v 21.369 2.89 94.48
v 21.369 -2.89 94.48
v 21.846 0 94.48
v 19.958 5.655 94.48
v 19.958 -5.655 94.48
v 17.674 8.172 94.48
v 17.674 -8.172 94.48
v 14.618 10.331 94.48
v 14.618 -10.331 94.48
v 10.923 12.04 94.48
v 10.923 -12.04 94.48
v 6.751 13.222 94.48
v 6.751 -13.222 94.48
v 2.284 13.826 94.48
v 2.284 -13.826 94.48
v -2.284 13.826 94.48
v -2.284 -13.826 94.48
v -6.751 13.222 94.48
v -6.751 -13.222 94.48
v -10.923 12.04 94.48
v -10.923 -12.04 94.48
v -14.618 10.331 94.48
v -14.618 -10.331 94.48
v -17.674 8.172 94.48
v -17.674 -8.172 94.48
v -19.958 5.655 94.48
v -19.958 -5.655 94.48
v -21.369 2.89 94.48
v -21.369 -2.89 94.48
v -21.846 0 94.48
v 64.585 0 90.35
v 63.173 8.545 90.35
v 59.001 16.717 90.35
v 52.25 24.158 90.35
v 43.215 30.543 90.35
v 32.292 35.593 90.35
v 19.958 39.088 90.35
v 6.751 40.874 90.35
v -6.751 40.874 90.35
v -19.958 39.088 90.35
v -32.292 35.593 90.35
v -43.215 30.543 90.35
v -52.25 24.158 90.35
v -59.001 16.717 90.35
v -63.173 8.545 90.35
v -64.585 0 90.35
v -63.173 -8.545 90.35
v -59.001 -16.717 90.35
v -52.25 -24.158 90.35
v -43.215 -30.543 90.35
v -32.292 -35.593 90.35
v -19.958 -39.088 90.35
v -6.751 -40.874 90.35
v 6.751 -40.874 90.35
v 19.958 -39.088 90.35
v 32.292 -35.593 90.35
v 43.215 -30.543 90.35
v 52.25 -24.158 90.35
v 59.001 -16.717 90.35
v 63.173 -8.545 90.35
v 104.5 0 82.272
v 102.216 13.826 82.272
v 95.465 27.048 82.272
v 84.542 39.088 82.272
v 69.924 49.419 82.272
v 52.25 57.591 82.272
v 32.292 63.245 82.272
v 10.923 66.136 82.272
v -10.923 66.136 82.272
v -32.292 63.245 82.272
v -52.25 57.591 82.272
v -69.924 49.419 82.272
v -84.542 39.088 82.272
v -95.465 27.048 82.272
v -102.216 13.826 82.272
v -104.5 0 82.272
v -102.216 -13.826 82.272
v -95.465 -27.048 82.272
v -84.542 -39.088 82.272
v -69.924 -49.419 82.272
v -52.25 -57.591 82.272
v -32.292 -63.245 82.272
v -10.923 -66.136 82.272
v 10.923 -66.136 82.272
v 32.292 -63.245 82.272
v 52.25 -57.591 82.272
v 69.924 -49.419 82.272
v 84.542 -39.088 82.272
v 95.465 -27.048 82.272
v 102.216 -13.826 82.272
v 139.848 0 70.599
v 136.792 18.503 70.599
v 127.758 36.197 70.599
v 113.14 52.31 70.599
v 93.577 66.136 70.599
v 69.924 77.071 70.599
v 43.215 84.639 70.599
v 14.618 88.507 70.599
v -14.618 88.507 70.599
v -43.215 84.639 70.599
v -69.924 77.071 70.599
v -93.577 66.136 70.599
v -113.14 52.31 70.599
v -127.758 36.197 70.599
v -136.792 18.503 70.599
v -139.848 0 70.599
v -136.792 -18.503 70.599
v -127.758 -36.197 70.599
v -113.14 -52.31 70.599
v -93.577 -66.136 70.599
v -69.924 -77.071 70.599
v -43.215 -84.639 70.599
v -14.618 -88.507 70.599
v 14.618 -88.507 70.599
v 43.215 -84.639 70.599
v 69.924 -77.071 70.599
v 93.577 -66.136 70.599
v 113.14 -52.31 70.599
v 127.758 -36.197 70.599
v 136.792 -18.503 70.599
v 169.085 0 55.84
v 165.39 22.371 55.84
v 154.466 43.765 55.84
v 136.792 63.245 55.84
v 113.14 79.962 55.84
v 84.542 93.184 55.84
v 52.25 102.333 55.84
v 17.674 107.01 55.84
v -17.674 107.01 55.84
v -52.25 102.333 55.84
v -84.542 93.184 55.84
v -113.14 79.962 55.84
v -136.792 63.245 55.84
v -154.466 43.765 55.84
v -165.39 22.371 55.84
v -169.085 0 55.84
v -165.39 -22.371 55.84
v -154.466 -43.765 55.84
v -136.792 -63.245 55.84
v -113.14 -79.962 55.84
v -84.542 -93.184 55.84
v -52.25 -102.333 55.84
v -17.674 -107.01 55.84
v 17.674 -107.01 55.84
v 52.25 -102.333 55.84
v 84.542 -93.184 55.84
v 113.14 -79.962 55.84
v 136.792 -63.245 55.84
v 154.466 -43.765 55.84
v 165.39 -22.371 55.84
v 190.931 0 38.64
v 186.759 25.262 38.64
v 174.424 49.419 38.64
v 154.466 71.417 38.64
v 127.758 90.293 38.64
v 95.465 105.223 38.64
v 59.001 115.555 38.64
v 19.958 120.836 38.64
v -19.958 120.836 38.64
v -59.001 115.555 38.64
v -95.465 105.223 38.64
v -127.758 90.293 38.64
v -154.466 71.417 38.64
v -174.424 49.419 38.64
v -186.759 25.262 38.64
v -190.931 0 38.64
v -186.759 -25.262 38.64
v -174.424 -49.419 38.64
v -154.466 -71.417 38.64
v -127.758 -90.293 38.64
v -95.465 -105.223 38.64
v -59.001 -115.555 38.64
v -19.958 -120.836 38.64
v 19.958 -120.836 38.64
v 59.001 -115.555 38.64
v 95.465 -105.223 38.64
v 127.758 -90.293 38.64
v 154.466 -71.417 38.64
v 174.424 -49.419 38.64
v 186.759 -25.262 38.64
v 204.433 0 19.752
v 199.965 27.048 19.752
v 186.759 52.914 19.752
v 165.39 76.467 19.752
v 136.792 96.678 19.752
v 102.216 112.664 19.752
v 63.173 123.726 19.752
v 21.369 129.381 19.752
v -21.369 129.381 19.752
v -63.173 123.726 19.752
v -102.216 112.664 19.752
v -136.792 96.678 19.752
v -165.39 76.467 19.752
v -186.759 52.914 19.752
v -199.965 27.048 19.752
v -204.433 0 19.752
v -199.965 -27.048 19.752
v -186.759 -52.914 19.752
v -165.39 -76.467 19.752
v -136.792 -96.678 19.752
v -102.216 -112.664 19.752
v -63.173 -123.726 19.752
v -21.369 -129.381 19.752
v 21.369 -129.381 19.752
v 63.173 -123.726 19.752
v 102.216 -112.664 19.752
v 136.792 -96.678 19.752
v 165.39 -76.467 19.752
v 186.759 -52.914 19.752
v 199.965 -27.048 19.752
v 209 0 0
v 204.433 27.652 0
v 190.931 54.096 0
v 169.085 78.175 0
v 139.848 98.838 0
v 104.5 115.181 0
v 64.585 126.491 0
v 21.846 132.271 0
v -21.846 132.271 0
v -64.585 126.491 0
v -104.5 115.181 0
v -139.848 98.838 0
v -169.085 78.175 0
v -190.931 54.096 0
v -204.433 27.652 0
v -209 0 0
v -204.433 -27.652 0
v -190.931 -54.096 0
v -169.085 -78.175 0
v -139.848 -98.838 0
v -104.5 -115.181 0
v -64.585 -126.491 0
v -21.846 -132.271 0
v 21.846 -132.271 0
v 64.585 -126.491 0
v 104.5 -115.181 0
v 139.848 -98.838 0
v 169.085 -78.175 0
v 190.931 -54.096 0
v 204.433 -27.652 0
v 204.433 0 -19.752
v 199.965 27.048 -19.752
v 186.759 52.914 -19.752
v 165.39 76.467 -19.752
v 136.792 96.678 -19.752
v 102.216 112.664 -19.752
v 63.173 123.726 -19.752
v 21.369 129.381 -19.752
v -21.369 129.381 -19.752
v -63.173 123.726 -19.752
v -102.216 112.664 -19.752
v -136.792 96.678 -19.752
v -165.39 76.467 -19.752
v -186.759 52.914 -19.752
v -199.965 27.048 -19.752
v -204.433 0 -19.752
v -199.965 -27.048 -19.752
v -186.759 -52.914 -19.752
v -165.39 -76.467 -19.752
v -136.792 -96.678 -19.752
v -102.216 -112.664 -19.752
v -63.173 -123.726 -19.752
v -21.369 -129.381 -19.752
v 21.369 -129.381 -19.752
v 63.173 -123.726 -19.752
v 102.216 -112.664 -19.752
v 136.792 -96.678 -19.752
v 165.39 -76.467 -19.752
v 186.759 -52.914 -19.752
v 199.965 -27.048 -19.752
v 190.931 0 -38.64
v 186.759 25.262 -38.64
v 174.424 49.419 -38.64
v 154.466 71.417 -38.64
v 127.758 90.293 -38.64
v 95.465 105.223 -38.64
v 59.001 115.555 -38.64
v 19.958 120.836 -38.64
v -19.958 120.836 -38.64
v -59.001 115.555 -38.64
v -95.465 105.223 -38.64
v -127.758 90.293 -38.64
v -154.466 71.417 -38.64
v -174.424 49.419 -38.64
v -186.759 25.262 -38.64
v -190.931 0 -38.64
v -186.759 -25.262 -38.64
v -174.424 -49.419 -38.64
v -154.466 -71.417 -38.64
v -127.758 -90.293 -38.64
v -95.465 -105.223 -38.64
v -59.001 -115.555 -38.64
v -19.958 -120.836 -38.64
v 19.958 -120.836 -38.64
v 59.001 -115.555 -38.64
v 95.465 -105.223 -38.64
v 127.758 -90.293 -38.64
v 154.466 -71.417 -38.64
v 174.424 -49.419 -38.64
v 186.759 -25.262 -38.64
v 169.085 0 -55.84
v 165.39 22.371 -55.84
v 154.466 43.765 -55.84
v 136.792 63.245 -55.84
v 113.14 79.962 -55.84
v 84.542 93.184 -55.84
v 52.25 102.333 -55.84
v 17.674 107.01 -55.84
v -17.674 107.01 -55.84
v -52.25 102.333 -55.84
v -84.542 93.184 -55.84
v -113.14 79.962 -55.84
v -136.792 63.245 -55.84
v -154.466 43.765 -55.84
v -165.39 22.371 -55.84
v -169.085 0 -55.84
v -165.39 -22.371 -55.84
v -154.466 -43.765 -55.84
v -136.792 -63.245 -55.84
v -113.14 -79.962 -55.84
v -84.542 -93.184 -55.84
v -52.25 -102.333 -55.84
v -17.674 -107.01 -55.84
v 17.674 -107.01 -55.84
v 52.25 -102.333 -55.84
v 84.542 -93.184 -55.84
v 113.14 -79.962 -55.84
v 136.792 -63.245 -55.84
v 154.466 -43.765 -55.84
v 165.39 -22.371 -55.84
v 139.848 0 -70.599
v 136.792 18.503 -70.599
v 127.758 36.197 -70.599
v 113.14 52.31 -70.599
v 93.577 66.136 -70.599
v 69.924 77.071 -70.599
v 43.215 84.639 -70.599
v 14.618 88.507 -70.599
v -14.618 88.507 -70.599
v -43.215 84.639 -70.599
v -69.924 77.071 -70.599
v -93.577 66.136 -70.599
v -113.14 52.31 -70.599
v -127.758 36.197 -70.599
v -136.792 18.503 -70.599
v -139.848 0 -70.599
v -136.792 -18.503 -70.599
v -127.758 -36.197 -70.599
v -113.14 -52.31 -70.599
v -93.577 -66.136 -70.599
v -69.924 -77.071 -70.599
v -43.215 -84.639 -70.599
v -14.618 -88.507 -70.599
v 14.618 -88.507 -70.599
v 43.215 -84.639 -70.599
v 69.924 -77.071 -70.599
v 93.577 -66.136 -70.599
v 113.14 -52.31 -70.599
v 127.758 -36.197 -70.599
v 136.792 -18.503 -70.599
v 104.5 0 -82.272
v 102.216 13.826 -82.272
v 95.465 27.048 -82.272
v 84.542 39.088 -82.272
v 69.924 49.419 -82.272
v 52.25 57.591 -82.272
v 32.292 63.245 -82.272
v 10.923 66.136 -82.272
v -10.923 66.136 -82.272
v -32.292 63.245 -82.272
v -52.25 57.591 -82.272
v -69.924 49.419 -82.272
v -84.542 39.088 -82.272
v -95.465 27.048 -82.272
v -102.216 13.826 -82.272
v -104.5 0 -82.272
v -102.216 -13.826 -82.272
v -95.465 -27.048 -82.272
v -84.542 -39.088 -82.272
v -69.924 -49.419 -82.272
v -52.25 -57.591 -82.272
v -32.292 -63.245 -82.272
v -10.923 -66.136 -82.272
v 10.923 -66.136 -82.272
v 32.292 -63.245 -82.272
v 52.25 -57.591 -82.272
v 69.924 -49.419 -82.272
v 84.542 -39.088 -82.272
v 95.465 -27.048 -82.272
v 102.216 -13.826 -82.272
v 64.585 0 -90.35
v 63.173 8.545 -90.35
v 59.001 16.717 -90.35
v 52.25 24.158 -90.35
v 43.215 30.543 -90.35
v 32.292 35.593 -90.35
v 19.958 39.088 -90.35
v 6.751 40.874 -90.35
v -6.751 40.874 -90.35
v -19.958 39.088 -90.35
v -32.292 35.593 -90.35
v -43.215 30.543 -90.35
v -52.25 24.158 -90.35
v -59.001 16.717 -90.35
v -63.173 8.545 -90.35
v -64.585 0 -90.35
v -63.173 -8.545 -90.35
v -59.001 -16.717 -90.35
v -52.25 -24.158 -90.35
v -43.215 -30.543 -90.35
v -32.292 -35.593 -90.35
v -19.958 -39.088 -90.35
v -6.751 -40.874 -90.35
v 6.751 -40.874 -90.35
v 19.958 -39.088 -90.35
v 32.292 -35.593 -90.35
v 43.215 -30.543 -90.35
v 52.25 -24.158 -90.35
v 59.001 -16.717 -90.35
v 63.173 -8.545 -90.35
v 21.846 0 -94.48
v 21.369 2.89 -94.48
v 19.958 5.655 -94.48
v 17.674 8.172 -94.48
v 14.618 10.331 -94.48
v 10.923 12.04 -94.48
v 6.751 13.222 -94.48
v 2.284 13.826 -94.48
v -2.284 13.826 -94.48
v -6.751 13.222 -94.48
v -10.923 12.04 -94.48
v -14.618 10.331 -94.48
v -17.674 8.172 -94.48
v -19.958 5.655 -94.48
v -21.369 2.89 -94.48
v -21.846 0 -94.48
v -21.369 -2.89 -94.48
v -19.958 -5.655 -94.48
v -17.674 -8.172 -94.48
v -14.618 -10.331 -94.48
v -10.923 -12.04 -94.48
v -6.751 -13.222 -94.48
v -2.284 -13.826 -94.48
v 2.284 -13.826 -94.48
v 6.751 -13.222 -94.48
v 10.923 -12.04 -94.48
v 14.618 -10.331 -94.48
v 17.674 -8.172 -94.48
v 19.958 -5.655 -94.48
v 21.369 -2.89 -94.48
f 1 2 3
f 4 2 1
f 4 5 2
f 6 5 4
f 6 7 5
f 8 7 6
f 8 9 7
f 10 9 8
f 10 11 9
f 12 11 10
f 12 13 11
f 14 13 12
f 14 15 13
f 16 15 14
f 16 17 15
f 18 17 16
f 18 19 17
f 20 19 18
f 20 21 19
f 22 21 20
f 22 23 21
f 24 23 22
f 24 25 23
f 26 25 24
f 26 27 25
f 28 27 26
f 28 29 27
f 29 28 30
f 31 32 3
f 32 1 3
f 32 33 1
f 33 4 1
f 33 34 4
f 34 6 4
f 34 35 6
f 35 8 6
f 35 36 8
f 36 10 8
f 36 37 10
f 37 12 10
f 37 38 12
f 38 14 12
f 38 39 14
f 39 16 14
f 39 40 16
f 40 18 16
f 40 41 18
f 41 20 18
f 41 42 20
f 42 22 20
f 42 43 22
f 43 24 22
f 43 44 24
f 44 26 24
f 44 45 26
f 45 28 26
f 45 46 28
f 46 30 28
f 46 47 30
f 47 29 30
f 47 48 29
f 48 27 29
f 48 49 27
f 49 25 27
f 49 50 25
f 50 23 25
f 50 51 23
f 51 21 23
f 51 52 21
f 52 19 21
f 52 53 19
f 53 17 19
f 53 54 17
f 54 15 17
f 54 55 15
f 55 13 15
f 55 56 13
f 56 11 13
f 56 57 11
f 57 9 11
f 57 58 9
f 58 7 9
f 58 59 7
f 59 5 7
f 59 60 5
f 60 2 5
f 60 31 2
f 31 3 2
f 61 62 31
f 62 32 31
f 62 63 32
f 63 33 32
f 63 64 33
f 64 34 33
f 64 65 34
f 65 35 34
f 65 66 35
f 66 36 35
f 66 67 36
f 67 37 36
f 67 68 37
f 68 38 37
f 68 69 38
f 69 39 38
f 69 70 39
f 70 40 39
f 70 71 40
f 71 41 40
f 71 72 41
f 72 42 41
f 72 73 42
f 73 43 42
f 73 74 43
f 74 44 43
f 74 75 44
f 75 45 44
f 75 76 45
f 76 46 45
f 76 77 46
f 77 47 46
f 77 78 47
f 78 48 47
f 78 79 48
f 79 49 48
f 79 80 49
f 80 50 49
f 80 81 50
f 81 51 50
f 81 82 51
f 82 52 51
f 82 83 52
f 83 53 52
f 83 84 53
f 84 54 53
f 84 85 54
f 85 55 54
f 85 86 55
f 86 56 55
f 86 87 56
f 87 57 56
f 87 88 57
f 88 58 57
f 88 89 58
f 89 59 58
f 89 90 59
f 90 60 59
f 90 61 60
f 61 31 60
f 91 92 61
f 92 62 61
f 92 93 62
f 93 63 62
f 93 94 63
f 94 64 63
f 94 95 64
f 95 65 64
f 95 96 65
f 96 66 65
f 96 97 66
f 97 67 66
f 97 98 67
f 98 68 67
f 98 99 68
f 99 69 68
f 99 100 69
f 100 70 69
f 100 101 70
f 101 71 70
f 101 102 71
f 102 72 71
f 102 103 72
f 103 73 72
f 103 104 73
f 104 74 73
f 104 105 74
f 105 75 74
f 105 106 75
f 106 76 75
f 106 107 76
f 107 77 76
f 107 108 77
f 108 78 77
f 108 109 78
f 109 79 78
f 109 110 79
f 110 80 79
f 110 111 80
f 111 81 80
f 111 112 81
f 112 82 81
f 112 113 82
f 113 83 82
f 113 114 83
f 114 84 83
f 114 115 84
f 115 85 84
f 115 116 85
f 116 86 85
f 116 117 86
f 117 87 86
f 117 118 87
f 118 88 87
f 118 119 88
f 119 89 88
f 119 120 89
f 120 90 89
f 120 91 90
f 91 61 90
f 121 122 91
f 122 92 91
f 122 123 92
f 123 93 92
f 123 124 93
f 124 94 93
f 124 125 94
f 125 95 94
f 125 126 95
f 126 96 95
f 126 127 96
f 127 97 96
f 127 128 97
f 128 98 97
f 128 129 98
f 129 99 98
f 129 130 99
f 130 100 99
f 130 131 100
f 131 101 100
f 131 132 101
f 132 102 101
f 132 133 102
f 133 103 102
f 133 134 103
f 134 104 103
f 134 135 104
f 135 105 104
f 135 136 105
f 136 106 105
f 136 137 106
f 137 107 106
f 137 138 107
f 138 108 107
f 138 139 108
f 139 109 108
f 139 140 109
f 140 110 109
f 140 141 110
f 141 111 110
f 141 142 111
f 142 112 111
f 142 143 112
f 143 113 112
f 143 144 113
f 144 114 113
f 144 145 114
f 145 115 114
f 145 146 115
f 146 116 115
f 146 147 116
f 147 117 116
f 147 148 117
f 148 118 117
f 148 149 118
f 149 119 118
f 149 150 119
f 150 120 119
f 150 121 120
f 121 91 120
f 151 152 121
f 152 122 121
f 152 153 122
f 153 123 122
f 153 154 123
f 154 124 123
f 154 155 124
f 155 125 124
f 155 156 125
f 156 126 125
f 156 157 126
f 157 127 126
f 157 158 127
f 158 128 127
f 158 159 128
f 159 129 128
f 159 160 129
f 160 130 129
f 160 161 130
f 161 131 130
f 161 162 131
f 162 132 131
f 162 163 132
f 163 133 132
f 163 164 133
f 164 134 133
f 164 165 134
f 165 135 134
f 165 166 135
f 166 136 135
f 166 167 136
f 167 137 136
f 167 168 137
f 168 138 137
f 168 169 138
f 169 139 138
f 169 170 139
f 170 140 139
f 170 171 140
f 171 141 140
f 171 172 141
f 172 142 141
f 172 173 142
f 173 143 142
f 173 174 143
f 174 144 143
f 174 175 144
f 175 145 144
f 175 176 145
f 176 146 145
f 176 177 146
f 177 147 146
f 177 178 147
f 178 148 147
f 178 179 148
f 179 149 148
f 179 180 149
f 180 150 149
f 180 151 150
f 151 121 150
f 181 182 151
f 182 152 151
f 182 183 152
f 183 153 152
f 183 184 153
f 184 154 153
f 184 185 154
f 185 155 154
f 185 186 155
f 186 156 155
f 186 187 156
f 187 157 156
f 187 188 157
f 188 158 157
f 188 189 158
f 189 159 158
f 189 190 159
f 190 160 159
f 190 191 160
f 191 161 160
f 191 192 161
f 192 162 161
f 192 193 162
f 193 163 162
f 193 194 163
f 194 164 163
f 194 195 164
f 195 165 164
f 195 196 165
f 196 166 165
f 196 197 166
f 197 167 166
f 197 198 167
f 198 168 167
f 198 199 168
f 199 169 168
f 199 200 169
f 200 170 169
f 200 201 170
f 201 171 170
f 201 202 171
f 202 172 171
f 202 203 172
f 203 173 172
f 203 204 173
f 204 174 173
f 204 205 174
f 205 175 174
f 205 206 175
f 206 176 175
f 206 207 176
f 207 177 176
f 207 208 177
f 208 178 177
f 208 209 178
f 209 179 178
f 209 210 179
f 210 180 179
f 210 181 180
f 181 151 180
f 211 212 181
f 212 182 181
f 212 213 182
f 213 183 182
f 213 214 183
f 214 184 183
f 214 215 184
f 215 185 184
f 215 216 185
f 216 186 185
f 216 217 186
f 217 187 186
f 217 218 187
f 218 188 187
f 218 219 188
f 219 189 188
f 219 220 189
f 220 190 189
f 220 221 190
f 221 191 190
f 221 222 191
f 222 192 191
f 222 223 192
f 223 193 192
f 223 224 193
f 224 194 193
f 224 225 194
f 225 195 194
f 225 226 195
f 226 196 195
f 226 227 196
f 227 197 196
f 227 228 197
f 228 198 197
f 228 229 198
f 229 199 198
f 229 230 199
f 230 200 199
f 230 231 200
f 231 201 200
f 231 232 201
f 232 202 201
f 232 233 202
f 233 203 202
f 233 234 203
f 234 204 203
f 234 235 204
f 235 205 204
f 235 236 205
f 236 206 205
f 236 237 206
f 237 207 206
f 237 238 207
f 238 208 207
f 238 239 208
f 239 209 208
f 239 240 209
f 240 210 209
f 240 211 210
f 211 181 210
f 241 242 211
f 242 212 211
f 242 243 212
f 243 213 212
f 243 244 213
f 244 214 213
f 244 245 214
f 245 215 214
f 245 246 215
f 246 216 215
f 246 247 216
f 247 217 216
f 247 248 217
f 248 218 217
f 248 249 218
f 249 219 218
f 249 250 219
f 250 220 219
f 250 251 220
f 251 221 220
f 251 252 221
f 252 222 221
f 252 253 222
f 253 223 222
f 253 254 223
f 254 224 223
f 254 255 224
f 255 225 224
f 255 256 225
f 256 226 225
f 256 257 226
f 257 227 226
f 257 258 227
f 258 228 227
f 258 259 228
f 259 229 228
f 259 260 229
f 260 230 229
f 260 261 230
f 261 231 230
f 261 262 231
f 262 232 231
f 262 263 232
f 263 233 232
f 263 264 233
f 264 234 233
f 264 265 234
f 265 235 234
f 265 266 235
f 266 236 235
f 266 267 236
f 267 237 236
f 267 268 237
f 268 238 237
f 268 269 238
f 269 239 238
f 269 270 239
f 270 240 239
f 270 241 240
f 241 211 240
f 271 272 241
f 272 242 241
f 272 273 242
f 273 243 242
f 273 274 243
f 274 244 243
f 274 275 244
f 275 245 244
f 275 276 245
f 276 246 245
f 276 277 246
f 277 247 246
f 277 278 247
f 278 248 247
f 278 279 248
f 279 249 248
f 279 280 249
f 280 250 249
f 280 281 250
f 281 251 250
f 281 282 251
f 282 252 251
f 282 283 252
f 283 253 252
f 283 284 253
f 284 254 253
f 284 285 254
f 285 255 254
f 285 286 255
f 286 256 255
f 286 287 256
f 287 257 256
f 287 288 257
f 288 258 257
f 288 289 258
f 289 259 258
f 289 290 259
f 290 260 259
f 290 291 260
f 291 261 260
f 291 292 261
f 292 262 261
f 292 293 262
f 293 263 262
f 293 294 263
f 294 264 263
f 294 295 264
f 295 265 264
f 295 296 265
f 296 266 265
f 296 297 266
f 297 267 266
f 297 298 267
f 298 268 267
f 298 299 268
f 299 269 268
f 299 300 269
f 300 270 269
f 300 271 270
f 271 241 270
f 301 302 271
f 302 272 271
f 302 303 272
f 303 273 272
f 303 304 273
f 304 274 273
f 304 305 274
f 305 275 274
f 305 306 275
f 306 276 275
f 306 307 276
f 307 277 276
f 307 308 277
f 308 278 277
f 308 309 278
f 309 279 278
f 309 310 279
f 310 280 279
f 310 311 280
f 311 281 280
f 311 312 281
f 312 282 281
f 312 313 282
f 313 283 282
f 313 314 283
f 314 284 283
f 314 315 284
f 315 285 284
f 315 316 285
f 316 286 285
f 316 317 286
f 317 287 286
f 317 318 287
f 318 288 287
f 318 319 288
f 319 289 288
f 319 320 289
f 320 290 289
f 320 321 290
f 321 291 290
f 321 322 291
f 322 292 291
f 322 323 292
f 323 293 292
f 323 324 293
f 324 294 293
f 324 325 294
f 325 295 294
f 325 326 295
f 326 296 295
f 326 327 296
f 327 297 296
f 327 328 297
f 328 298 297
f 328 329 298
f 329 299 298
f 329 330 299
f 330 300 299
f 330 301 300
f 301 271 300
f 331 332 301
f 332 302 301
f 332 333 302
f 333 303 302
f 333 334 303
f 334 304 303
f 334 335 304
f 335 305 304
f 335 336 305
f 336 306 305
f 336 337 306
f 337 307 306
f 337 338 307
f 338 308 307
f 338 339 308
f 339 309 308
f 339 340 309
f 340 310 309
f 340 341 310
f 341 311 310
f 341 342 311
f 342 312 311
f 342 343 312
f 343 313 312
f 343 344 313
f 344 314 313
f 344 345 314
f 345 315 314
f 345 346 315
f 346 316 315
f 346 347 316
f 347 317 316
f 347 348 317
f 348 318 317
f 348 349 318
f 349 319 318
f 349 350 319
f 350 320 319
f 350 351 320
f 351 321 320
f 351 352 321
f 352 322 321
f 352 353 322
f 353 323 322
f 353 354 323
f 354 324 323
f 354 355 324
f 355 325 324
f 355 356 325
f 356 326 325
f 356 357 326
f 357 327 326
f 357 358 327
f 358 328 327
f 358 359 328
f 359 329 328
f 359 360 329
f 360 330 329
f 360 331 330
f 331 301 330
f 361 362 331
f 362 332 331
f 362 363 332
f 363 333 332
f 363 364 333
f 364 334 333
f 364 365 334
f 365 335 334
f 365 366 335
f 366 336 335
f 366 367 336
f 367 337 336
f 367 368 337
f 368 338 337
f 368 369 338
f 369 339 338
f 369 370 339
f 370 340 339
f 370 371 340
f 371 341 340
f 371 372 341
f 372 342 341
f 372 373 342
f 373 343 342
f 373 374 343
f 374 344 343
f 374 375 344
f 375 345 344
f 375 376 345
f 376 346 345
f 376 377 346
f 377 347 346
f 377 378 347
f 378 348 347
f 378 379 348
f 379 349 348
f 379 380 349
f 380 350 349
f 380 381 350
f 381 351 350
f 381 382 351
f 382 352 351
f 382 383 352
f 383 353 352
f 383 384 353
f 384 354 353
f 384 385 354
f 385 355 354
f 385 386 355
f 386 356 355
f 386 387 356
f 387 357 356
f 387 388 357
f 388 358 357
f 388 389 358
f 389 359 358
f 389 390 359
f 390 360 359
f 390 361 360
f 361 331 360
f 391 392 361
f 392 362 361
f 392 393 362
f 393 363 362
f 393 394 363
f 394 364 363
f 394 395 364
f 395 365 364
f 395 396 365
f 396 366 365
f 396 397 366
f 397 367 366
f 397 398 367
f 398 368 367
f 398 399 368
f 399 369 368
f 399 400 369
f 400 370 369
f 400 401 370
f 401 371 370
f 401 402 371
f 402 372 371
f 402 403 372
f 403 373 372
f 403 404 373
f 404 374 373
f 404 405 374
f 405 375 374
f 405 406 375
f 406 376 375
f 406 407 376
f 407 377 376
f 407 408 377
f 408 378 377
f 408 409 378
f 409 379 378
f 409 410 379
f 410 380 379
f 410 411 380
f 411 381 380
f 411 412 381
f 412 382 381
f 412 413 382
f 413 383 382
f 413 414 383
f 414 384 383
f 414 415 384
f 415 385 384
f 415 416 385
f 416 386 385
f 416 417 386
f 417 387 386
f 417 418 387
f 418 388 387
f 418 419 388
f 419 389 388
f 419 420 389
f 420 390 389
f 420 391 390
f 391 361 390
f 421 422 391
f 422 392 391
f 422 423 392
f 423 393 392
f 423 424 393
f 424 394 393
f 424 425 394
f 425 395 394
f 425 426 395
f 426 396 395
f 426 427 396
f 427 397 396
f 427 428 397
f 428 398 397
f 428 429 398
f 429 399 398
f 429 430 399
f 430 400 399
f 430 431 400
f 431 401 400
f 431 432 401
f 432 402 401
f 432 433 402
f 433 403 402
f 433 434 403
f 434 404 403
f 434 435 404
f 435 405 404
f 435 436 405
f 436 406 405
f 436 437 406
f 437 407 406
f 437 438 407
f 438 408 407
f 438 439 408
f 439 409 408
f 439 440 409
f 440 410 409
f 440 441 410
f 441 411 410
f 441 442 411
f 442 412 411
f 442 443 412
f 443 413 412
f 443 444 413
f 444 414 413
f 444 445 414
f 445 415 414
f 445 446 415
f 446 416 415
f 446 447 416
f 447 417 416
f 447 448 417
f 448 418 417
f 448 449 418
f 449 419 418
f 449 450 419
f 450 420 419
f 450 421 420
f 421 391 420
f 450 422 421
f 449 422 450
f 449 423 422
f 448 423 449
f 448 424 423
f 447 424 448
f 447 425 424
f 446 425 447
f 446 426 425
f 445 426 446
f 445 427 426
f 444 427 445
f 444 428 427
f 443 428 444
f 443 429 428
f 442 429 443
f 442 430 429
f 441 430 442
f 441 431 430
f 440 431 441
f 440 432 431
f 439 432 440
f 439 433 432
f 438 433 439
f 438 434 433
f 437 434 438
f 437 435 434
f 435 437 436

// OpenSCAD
// Generated by SolidPython 1.0.1 on 2020-07-29 00:46:49


scale(v = [11, 7, 5]) {
	sphere(r = 19);
}
/***********************************************
*********      SolidPython code:      **********
************************************************
 
# import packages: SolidPython
from solid import *
from solid.utils import *
from itertools import chain, combinations, permutations


class Resize:

    def __init__(self, scad_file):
        self.scad_file = scad_file
        #self.scad_file = import_scad(scad_file)
        # cone/cylinder param:
        self.r1 = 0
        self.r2 = 0
        self.h = 0
        # rectangular prism param:
        self.w = 0
        self.l = 0
        # ellipse param:
        self.r = 0

    # import OpenScad code (file name corresponds to shape)


    # classify shape + parameters
    def assign(self, param1, param2, param3):
        if self.scad_file == 'cone.scad':
            self.r1 = param1
            self.r2 = param2
            self.h = param3
        elif self.scad_file == 'cylinder.scad':
            self.r1 = param1
            self.r2 = param2
            self.h = param3
        elif self.scad_file == 'rectangularPrism.scad':
            self.h = param1
            self.l = param2
            self.w = param3
        else:
            self.r = param1
            self.h = param2

    # resize parameters
    def iterate(self):
        x = range(3, 20, 2)
        i = 1
        if self.scad_file == 'cone.scad':
            tempList = list(permutations(x, 2))
            for temp in tempList:
                param1 = temp[0]
                param2 = temp[1]
                filepath = 'produced_scad_files/' + 'cone' + str(param1) + '_' + str(param2) + '_' + '.scad'
                scad_render_to_file(cylinder(h=param1, r1=param2, r2=0), filepath)

        elif self.scad_file == 'cylinder.scad':
            tempList = list(permutations(x, 3))
            for temp in tempList:
                param1 = temp[0]
                param2 = temp[1]
                filepath = 'produced_scad_files/' + 'cylinder' + str(param1) + '_' + str(param2) + '_' + '.scad'
                scad_render_to_file(cylinder(h=param1, r1=param2, r2=param2), filepath)

        elif self.scad_file == 'rectangularPrism.scad':
            tempList = list(permutations(x, 3))
            for temp in tempList:
                param1 = temp[0]
                param2 = temp[1]
                param3 = temp[2]
                filepath = 'produced_scad_files/' + 'rectangularPrism' + str(param1) + '_' + str(param2) + '_' + str(
                    param3) + '.scad'
                scad_render_to_file(cube(size=(param1, param2, param3)), filepath)

        elif self.scad_file == 'ellipse.scad':
            tempList = list(permutations(x, 4))
            for temp in tempList:
                param1 = temp[0]
                param2 = temp[1]
                param3 = temp[2]
                param4 = temp[3]
                filepath = 'produced_scad_files/' + 'ellipse' + str(param1) + '_' + str(param2) + '_' + str(param3) + '_' + str(param4) + '.scad'
                scad_render_to_file(scale([param1, param2, param3])(sphere(r=param4)), filepath)

    def render_to_scadfile(self):
        scad_render_to_file(scad, 'example.scad') 
 
************************************************/
